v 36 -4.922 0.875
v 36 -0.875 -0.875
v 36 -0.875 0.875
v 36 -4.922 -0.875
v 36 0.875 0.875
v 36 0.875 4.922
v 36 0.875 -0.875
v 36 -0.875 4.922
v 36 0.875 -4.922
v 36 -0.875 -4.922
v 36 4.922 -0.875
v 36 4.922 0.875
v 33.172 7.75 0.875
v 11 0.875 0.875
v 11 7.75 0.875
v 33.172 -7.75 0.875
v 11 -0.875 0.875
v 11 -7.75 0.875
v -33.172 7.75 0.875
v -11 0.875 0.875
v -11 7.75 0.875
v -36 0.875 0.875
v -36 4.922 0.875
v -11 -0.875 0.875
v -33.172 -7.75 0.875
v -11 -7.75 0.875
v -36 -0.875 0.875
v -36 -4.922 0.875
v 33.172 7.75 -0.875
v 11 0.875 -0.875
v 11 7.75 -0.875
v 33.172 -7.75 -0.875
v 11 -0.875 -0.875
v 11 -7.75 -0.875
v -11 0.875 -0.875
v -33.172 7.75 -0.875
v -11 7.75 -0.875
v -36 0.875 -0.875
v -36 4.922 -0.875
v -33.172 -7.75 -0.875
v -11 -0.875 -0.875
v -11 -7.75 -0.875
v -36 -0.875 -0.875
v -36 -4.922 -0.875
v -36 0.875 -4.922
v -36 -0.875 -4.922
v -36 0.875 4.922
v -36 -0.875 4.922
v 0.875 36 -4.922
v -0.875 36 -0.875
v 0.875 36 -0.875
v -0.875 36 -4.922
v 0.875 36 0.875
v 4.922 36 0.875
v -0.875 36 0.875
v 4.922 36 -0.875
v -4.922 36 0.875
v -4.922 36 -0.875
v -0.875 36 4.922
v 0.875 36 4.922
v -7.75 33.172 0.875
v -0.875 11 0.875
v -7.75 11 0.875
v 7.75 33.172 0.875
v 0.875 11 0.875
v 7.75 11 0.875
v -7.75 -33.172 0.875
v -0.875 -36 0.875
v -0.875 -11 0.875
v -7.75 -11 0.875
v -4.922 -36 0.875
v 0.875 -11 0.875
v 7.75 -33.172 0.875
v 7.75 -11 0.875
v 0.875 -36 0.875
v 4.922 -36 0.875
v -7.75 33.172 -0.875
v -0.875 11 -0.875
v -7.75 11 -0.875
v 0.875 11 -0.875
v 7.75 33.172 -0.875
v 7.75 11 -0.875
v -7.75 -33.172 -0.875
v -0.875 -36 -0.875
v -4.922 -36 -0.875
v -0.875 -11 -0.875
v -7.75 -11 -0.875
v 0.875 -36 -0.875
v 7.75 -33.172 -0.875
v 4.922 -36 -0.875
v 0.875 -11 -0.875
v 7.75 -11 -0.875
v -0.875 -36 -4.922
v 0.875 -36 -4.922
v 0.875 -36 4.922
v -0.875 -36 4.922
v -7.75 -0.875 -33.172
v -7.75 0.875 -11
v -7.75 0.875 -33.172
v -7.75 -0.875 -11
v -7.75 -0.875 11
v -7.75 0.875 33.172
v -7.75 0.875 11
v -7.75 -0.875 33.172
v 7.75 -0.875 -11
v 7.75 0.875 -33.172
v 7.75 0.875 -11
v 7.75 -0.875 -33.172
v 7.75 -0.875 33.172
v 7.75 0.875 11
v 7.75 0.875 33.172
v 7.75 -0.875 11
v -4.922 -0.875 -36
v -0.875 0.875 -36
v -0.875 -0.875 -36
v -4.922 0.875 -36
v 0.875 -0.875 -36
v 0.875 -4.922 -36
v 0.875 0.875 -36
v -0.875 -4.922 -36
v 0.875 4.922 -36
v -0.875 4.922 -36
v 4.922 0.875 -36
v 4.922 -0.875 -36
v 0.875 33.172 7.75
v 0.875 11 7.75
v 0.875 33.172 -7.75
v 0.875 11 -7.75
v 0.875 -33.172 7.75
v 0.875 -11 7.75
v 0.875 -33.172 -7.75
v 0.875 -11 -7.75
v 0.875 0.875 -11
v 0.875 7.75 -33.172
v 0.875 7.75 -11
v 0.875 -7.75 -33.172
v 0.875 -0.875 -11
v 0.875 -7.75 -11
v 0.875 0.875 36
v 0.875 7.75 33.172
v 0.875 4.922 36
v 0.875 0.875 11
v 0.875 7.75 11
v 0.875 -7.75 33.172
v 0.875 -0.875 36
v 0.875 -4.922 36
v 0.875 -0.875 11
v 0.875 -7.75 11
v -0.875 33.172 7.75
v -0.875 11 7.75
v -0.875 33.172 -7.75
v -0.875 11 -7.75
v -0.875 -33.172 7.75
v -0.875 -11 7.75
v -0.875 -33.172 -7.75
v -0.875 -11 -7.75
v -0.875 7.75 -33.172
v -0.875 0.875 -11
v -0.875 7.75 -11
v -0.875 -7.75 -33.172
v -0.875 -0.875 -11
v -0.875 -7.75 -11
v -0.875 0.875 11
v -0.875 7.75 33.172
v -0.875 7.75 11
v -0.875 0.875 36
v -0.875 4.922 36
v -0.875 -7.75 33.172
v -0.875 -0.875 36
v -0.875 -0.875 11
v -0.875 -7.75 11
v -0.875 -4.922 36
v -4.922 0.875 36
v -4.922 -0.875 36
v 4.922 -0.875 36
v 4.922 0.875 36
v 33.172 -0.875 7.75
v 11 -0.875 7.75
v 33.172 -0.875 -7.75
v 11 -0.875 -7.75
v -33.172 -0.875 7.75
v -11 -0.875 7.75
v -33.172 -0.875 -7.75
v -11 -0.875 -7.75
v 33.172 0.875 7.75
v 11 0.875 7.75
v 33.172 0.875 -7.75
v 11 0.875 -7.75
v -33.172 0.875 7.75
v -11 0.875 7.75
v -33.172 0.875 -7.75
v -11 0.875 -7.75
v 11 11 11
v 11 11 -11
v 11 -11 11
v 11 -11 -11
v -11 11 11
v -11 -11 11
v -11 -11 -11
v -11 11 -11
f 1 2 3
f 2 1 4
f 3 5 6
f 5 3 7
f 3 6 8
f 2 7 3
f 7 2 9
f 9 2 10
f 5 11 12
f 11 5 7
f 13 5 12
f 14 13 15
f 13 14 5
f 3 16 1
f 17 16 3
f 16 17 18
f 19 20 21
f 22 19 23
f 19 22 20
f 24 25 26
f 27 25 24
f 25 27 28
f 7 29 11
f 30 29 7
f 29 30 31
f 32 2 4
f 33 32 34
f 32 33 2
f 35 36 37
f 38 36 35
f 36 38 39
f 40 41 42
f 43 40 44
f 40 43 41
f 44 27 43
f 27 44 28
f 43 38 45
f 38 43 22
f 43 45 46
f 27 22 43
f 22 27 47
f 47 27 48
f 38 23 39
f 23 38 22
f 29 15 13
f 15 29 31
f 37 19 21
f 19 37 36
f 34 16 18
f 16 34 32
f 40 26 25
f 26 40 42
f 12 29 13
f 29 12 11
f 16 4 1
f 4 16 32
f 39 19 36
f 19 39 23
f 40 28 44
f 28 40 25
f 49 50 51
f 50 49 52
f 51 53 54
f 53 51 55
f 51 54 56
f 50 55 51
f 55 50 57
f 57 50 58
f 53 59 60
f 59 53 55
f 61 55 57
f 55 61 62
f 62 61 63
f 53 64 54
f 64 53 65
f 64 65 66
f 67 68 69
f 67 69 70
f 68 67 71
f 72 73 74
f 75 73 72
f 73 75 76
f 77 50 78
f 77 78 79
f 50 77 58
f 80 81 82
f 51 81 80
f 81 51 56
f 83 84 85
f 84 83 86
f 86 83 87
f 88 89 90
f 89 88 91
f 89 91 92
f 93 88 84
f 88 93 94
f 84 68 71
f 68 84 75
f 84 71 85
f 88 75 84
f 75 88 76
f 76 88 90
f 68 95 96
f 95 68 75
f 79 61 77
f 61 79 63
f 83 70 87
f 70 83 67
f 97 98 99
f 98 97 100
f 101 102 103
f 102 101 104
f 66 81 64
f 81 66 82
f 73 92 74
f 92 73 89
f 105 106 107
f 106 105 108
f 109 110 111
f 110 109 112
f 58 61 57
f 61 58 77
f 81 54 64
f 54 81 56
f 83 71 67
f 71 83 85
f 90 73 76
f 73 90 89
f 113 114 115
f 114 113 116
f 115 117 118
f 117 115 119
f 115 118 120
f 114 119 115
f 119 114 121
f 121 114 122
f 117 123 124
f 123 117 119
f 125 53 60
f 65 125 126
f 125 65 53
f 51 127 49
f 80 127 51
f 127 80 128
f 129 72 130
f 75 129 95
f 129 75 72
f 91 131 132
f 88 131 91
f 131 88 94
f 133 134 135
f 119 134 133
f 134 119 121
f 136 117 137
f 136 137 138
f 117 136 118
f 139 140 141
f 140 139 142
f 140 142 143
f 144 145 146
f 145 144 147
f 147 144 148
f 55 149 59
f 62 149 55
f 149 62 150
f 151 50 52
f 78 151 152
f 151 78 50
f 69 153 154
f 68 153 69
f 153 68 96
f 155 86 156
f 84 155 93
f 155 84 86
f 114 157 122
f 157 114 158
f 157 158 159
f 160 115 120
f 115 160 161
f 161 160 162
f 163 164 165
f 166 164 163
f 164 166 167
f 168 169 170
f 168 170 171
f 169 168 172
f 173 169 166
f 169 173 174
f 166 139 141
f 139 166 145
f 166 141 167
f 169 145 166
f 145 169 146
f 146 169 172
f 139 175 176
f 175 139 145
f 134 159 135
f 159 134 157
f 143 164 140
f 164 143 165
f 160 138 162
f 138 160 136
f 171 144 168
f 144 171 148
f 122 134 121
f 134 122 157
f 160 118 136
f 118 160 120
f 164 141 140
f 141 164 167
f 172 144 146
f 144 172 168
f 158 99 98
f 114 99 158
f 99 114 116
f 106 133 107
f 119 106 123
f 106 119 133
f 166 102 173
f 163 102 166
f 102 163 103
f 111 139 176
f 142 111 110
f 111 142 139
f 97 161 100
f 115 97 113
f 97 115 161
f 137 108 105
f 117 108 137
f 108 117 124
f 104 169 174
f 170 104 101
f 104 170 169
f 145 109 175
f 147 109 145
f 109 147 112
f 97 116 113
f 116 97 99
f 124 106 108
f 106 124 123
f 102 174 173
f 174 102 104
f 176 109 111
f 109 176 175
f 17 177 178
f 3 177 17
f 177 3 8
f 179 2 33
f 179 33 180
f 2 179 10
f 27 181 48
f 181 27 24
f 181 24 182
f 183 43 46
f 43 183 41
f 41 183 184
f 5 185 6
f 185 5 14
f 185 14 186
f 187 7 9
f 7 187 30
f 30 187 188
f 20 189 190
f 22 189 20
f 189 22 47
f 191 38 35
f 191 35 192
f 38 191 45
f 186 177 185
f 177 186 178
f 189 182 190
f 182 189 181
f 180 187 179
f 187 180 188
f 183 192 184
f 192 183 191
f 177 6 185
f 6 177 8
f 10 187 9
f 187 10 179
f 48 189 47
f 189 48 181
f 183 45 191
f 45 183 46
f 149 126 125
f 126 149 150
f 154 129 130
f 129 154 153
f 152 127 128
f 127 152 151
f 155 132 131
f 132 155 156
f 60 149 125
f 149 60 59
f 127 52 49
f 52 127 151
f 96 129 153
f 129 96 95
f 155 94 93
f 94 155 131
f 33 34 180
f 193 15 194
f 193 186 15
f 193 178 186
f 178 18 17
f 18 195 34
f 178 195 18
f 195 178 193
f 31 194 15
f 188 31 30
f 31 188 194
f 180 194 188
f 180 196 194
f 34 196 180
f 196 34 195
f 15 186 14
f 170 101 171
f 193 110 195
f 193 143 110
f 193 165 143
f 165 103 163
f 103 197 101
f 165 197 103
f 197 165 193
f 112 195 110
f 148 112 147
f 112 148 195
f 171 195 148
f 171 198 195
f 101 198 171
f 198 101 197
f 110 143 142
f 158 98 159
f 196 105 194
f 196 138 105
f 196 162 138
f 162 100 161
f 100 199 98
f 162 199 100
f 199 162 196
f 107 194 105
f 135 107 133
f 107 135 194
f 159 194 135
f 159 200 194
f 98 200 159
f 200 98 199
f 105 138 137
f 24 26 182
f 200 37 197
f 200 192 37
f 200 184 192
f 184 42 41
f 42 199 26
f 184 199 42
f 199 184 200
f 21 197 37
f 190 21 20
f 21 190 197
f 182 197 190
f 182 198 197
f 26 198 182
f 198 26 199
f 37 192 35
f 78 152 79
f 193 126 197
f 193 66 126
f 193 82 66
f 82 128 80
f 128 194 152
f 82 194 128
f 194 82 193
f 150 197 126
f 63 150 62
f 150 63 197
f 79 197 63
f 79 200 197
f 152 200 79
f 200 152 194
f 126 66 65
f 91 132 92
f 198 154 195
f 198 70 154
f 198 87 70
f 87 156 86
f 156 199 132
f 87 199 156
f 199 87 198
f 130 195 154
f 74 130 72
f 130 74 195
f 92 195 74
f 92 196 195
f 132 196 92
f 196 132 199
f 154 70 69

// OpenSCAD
// file: chaos_toy.scad
// chaos_toy.scad

// Chaos Toy part library by W. Craig Trader is dual-licensed under 
// Creative Commons Attribution-ShareAlike 3.0 Unported License and
// GNU Lesser GPL 3.0 or later.

include <MCAD/units.scad>

// ----- Measurements ---------------------------------------------------------

rch = 1 / 128 * inch;

BALL_OD = 92 * rch;

JACK_BASE = 22 * mm; // 111 * rch; 
JACK_SPAR_LEN = 25 * mm; // 126 * rch; // 25 * mm;
JACK_SPAR_WID = 15.5 * mm; // 78 * rch;
JACK_SPAR_DEP = 1.75 * mm; // 9 * rch;
JACK_SIZE = JACK_SPAR_LEN + JACK_BASE + JACK_SPAR_LEN;

TUBE_ID = 78.5 * rch;
TUBE_OD = 96.5 * rch;

TUBE_SMALL = 15 * cm;
TUBE_MEDIUM = TUBE_SMALL + JACK_BASE + TUBE_SMALL;
TUBE_LONG = TUBE_MEDIUM + JACK_BASE + TUBE_SMALL;

// ----- Measurement Checks ---------------------------------------------------

function inches( d ) =
	str( floor( d/inch ), "+", floor( 128 * ( d/inch - floor( d/inch ) ) ), "/128 in." );

function verbose_measurement( label, dimension ) = 
	str( label, " = ", dimension, "mm or ", inches( dimension ) );

module echo_all_measurements() {
	echo( verbose_measurement( "Ball diameter", BALL_OD ) );

	echo( verbose_measurement( "Tube inside diameter", TUBE_ID ) );
	echo( verbose_measurement( "Tube outside diameter", TUBE_OD ) );

	echo( verbose_measurement( "Small tube length", TUBE_SMALL ) );
	echo( verbose_measurement( "Medium tube length", TUBE_MEDIUM ) );
	echo( verbose_measurement( "Long tube length", TUBE_LONG ) );

	echo( verbose_measurement( "Jack base", JACK_BASE ) );
	echo( verbose_measurement( "Jack spar length", JACK_SPAR_LEN ) );
	echo( verbose_measurement( "Jack spar width", JACK_SPAR_WID ) );
	echo( verbose_measurement( "Jack spar depth", JACK_SPAR_DEP ) );
	echo( verbose_measurement( "Jack size", JACK_SIZE ) );
}

// echo_all_measurements();

// ----- Ball -----------------------------------------------------------------

module ball () {
	color( [1,1,0,1] ) 
	sphere( r=BALL_DIAMETER );
}

// ----- Tubes ----------------------------------------------------------------

module tube( length ) {
	color( [0,0,1,1] )
	difference() {
		cylinder( h=length, r=TUBE_OD/2, center=true, $fn=90 );
		cylinder( h=length+2*mm, r=TUBE_ID/2, center=true, $fn=90 );
	}
}

//tube( TUBE_SMALL );
//translate( [25,0,0] ) tube( TUBE_MEDIUM );
//translate( [50,0,0] ) tube( TUBE_LONG );

// ----- Jacks ----------------------------------------------------------------

module jack_spar() {
	x = JACK_SIZE / 2;
	y = JACK_SPAR_WID / 2;
	difference() {
		cube( [ JACK_SIZE, JACK_SPAR_WID, JACK_SPAR_DEP ], true );
		translate( [+x,+y,0] ) rotate( [0,0,45] ) cube( 4*mm, true );
		translate( [+x,-y,0] ) rotate( [0,0,45] ) cube( 4*mm, true );
		translate( [-x,+y,0] ) rotate( [0,0,45] ) cube( 4*mm, true );
		translate( [-x,-y,0] ) rotate( [0,0,45] ) cube( 4*mm, true );
	}
}

module jack() {
	color( [0,0,0,1] )
	union() {
		jack_spar();
		rotate( [00,00,90] ) jack_spar();
		rotate( [00,90,00] ) jack_spar();
		rotate( [00,90,90] ) jack_spar();
		rotate( [90,00,00] ) jack_spar();
		rotate( [90,00,90] ) jack_spar();
		cube( JACK_BASE, center=true );
	}
}

// jack_spar();
// jack();
// main file
// chaos_toy_jack.scad

// Chaos Toy part library by W. Craig Trader is dual-licensed under 
// Creative Commons Attribution-ShareAlike 3.0 Unported License and
// GNU Lesser GPL 3.0 or later.

include <chaos_toy.scad>

jack();

//rotate( [37.5,0,0] )
//rotate( [0,45,0] )
//	union() {
//		color([1,0,0]) cube( [100,1,1], true );
//		color([0,1,0]) rotate( [0,0,90] ) cube( [100,1,1], true );
//		color([0,0,1]) rotate( [0,90,0] ) cube( [100,1,1], true );
//	}
